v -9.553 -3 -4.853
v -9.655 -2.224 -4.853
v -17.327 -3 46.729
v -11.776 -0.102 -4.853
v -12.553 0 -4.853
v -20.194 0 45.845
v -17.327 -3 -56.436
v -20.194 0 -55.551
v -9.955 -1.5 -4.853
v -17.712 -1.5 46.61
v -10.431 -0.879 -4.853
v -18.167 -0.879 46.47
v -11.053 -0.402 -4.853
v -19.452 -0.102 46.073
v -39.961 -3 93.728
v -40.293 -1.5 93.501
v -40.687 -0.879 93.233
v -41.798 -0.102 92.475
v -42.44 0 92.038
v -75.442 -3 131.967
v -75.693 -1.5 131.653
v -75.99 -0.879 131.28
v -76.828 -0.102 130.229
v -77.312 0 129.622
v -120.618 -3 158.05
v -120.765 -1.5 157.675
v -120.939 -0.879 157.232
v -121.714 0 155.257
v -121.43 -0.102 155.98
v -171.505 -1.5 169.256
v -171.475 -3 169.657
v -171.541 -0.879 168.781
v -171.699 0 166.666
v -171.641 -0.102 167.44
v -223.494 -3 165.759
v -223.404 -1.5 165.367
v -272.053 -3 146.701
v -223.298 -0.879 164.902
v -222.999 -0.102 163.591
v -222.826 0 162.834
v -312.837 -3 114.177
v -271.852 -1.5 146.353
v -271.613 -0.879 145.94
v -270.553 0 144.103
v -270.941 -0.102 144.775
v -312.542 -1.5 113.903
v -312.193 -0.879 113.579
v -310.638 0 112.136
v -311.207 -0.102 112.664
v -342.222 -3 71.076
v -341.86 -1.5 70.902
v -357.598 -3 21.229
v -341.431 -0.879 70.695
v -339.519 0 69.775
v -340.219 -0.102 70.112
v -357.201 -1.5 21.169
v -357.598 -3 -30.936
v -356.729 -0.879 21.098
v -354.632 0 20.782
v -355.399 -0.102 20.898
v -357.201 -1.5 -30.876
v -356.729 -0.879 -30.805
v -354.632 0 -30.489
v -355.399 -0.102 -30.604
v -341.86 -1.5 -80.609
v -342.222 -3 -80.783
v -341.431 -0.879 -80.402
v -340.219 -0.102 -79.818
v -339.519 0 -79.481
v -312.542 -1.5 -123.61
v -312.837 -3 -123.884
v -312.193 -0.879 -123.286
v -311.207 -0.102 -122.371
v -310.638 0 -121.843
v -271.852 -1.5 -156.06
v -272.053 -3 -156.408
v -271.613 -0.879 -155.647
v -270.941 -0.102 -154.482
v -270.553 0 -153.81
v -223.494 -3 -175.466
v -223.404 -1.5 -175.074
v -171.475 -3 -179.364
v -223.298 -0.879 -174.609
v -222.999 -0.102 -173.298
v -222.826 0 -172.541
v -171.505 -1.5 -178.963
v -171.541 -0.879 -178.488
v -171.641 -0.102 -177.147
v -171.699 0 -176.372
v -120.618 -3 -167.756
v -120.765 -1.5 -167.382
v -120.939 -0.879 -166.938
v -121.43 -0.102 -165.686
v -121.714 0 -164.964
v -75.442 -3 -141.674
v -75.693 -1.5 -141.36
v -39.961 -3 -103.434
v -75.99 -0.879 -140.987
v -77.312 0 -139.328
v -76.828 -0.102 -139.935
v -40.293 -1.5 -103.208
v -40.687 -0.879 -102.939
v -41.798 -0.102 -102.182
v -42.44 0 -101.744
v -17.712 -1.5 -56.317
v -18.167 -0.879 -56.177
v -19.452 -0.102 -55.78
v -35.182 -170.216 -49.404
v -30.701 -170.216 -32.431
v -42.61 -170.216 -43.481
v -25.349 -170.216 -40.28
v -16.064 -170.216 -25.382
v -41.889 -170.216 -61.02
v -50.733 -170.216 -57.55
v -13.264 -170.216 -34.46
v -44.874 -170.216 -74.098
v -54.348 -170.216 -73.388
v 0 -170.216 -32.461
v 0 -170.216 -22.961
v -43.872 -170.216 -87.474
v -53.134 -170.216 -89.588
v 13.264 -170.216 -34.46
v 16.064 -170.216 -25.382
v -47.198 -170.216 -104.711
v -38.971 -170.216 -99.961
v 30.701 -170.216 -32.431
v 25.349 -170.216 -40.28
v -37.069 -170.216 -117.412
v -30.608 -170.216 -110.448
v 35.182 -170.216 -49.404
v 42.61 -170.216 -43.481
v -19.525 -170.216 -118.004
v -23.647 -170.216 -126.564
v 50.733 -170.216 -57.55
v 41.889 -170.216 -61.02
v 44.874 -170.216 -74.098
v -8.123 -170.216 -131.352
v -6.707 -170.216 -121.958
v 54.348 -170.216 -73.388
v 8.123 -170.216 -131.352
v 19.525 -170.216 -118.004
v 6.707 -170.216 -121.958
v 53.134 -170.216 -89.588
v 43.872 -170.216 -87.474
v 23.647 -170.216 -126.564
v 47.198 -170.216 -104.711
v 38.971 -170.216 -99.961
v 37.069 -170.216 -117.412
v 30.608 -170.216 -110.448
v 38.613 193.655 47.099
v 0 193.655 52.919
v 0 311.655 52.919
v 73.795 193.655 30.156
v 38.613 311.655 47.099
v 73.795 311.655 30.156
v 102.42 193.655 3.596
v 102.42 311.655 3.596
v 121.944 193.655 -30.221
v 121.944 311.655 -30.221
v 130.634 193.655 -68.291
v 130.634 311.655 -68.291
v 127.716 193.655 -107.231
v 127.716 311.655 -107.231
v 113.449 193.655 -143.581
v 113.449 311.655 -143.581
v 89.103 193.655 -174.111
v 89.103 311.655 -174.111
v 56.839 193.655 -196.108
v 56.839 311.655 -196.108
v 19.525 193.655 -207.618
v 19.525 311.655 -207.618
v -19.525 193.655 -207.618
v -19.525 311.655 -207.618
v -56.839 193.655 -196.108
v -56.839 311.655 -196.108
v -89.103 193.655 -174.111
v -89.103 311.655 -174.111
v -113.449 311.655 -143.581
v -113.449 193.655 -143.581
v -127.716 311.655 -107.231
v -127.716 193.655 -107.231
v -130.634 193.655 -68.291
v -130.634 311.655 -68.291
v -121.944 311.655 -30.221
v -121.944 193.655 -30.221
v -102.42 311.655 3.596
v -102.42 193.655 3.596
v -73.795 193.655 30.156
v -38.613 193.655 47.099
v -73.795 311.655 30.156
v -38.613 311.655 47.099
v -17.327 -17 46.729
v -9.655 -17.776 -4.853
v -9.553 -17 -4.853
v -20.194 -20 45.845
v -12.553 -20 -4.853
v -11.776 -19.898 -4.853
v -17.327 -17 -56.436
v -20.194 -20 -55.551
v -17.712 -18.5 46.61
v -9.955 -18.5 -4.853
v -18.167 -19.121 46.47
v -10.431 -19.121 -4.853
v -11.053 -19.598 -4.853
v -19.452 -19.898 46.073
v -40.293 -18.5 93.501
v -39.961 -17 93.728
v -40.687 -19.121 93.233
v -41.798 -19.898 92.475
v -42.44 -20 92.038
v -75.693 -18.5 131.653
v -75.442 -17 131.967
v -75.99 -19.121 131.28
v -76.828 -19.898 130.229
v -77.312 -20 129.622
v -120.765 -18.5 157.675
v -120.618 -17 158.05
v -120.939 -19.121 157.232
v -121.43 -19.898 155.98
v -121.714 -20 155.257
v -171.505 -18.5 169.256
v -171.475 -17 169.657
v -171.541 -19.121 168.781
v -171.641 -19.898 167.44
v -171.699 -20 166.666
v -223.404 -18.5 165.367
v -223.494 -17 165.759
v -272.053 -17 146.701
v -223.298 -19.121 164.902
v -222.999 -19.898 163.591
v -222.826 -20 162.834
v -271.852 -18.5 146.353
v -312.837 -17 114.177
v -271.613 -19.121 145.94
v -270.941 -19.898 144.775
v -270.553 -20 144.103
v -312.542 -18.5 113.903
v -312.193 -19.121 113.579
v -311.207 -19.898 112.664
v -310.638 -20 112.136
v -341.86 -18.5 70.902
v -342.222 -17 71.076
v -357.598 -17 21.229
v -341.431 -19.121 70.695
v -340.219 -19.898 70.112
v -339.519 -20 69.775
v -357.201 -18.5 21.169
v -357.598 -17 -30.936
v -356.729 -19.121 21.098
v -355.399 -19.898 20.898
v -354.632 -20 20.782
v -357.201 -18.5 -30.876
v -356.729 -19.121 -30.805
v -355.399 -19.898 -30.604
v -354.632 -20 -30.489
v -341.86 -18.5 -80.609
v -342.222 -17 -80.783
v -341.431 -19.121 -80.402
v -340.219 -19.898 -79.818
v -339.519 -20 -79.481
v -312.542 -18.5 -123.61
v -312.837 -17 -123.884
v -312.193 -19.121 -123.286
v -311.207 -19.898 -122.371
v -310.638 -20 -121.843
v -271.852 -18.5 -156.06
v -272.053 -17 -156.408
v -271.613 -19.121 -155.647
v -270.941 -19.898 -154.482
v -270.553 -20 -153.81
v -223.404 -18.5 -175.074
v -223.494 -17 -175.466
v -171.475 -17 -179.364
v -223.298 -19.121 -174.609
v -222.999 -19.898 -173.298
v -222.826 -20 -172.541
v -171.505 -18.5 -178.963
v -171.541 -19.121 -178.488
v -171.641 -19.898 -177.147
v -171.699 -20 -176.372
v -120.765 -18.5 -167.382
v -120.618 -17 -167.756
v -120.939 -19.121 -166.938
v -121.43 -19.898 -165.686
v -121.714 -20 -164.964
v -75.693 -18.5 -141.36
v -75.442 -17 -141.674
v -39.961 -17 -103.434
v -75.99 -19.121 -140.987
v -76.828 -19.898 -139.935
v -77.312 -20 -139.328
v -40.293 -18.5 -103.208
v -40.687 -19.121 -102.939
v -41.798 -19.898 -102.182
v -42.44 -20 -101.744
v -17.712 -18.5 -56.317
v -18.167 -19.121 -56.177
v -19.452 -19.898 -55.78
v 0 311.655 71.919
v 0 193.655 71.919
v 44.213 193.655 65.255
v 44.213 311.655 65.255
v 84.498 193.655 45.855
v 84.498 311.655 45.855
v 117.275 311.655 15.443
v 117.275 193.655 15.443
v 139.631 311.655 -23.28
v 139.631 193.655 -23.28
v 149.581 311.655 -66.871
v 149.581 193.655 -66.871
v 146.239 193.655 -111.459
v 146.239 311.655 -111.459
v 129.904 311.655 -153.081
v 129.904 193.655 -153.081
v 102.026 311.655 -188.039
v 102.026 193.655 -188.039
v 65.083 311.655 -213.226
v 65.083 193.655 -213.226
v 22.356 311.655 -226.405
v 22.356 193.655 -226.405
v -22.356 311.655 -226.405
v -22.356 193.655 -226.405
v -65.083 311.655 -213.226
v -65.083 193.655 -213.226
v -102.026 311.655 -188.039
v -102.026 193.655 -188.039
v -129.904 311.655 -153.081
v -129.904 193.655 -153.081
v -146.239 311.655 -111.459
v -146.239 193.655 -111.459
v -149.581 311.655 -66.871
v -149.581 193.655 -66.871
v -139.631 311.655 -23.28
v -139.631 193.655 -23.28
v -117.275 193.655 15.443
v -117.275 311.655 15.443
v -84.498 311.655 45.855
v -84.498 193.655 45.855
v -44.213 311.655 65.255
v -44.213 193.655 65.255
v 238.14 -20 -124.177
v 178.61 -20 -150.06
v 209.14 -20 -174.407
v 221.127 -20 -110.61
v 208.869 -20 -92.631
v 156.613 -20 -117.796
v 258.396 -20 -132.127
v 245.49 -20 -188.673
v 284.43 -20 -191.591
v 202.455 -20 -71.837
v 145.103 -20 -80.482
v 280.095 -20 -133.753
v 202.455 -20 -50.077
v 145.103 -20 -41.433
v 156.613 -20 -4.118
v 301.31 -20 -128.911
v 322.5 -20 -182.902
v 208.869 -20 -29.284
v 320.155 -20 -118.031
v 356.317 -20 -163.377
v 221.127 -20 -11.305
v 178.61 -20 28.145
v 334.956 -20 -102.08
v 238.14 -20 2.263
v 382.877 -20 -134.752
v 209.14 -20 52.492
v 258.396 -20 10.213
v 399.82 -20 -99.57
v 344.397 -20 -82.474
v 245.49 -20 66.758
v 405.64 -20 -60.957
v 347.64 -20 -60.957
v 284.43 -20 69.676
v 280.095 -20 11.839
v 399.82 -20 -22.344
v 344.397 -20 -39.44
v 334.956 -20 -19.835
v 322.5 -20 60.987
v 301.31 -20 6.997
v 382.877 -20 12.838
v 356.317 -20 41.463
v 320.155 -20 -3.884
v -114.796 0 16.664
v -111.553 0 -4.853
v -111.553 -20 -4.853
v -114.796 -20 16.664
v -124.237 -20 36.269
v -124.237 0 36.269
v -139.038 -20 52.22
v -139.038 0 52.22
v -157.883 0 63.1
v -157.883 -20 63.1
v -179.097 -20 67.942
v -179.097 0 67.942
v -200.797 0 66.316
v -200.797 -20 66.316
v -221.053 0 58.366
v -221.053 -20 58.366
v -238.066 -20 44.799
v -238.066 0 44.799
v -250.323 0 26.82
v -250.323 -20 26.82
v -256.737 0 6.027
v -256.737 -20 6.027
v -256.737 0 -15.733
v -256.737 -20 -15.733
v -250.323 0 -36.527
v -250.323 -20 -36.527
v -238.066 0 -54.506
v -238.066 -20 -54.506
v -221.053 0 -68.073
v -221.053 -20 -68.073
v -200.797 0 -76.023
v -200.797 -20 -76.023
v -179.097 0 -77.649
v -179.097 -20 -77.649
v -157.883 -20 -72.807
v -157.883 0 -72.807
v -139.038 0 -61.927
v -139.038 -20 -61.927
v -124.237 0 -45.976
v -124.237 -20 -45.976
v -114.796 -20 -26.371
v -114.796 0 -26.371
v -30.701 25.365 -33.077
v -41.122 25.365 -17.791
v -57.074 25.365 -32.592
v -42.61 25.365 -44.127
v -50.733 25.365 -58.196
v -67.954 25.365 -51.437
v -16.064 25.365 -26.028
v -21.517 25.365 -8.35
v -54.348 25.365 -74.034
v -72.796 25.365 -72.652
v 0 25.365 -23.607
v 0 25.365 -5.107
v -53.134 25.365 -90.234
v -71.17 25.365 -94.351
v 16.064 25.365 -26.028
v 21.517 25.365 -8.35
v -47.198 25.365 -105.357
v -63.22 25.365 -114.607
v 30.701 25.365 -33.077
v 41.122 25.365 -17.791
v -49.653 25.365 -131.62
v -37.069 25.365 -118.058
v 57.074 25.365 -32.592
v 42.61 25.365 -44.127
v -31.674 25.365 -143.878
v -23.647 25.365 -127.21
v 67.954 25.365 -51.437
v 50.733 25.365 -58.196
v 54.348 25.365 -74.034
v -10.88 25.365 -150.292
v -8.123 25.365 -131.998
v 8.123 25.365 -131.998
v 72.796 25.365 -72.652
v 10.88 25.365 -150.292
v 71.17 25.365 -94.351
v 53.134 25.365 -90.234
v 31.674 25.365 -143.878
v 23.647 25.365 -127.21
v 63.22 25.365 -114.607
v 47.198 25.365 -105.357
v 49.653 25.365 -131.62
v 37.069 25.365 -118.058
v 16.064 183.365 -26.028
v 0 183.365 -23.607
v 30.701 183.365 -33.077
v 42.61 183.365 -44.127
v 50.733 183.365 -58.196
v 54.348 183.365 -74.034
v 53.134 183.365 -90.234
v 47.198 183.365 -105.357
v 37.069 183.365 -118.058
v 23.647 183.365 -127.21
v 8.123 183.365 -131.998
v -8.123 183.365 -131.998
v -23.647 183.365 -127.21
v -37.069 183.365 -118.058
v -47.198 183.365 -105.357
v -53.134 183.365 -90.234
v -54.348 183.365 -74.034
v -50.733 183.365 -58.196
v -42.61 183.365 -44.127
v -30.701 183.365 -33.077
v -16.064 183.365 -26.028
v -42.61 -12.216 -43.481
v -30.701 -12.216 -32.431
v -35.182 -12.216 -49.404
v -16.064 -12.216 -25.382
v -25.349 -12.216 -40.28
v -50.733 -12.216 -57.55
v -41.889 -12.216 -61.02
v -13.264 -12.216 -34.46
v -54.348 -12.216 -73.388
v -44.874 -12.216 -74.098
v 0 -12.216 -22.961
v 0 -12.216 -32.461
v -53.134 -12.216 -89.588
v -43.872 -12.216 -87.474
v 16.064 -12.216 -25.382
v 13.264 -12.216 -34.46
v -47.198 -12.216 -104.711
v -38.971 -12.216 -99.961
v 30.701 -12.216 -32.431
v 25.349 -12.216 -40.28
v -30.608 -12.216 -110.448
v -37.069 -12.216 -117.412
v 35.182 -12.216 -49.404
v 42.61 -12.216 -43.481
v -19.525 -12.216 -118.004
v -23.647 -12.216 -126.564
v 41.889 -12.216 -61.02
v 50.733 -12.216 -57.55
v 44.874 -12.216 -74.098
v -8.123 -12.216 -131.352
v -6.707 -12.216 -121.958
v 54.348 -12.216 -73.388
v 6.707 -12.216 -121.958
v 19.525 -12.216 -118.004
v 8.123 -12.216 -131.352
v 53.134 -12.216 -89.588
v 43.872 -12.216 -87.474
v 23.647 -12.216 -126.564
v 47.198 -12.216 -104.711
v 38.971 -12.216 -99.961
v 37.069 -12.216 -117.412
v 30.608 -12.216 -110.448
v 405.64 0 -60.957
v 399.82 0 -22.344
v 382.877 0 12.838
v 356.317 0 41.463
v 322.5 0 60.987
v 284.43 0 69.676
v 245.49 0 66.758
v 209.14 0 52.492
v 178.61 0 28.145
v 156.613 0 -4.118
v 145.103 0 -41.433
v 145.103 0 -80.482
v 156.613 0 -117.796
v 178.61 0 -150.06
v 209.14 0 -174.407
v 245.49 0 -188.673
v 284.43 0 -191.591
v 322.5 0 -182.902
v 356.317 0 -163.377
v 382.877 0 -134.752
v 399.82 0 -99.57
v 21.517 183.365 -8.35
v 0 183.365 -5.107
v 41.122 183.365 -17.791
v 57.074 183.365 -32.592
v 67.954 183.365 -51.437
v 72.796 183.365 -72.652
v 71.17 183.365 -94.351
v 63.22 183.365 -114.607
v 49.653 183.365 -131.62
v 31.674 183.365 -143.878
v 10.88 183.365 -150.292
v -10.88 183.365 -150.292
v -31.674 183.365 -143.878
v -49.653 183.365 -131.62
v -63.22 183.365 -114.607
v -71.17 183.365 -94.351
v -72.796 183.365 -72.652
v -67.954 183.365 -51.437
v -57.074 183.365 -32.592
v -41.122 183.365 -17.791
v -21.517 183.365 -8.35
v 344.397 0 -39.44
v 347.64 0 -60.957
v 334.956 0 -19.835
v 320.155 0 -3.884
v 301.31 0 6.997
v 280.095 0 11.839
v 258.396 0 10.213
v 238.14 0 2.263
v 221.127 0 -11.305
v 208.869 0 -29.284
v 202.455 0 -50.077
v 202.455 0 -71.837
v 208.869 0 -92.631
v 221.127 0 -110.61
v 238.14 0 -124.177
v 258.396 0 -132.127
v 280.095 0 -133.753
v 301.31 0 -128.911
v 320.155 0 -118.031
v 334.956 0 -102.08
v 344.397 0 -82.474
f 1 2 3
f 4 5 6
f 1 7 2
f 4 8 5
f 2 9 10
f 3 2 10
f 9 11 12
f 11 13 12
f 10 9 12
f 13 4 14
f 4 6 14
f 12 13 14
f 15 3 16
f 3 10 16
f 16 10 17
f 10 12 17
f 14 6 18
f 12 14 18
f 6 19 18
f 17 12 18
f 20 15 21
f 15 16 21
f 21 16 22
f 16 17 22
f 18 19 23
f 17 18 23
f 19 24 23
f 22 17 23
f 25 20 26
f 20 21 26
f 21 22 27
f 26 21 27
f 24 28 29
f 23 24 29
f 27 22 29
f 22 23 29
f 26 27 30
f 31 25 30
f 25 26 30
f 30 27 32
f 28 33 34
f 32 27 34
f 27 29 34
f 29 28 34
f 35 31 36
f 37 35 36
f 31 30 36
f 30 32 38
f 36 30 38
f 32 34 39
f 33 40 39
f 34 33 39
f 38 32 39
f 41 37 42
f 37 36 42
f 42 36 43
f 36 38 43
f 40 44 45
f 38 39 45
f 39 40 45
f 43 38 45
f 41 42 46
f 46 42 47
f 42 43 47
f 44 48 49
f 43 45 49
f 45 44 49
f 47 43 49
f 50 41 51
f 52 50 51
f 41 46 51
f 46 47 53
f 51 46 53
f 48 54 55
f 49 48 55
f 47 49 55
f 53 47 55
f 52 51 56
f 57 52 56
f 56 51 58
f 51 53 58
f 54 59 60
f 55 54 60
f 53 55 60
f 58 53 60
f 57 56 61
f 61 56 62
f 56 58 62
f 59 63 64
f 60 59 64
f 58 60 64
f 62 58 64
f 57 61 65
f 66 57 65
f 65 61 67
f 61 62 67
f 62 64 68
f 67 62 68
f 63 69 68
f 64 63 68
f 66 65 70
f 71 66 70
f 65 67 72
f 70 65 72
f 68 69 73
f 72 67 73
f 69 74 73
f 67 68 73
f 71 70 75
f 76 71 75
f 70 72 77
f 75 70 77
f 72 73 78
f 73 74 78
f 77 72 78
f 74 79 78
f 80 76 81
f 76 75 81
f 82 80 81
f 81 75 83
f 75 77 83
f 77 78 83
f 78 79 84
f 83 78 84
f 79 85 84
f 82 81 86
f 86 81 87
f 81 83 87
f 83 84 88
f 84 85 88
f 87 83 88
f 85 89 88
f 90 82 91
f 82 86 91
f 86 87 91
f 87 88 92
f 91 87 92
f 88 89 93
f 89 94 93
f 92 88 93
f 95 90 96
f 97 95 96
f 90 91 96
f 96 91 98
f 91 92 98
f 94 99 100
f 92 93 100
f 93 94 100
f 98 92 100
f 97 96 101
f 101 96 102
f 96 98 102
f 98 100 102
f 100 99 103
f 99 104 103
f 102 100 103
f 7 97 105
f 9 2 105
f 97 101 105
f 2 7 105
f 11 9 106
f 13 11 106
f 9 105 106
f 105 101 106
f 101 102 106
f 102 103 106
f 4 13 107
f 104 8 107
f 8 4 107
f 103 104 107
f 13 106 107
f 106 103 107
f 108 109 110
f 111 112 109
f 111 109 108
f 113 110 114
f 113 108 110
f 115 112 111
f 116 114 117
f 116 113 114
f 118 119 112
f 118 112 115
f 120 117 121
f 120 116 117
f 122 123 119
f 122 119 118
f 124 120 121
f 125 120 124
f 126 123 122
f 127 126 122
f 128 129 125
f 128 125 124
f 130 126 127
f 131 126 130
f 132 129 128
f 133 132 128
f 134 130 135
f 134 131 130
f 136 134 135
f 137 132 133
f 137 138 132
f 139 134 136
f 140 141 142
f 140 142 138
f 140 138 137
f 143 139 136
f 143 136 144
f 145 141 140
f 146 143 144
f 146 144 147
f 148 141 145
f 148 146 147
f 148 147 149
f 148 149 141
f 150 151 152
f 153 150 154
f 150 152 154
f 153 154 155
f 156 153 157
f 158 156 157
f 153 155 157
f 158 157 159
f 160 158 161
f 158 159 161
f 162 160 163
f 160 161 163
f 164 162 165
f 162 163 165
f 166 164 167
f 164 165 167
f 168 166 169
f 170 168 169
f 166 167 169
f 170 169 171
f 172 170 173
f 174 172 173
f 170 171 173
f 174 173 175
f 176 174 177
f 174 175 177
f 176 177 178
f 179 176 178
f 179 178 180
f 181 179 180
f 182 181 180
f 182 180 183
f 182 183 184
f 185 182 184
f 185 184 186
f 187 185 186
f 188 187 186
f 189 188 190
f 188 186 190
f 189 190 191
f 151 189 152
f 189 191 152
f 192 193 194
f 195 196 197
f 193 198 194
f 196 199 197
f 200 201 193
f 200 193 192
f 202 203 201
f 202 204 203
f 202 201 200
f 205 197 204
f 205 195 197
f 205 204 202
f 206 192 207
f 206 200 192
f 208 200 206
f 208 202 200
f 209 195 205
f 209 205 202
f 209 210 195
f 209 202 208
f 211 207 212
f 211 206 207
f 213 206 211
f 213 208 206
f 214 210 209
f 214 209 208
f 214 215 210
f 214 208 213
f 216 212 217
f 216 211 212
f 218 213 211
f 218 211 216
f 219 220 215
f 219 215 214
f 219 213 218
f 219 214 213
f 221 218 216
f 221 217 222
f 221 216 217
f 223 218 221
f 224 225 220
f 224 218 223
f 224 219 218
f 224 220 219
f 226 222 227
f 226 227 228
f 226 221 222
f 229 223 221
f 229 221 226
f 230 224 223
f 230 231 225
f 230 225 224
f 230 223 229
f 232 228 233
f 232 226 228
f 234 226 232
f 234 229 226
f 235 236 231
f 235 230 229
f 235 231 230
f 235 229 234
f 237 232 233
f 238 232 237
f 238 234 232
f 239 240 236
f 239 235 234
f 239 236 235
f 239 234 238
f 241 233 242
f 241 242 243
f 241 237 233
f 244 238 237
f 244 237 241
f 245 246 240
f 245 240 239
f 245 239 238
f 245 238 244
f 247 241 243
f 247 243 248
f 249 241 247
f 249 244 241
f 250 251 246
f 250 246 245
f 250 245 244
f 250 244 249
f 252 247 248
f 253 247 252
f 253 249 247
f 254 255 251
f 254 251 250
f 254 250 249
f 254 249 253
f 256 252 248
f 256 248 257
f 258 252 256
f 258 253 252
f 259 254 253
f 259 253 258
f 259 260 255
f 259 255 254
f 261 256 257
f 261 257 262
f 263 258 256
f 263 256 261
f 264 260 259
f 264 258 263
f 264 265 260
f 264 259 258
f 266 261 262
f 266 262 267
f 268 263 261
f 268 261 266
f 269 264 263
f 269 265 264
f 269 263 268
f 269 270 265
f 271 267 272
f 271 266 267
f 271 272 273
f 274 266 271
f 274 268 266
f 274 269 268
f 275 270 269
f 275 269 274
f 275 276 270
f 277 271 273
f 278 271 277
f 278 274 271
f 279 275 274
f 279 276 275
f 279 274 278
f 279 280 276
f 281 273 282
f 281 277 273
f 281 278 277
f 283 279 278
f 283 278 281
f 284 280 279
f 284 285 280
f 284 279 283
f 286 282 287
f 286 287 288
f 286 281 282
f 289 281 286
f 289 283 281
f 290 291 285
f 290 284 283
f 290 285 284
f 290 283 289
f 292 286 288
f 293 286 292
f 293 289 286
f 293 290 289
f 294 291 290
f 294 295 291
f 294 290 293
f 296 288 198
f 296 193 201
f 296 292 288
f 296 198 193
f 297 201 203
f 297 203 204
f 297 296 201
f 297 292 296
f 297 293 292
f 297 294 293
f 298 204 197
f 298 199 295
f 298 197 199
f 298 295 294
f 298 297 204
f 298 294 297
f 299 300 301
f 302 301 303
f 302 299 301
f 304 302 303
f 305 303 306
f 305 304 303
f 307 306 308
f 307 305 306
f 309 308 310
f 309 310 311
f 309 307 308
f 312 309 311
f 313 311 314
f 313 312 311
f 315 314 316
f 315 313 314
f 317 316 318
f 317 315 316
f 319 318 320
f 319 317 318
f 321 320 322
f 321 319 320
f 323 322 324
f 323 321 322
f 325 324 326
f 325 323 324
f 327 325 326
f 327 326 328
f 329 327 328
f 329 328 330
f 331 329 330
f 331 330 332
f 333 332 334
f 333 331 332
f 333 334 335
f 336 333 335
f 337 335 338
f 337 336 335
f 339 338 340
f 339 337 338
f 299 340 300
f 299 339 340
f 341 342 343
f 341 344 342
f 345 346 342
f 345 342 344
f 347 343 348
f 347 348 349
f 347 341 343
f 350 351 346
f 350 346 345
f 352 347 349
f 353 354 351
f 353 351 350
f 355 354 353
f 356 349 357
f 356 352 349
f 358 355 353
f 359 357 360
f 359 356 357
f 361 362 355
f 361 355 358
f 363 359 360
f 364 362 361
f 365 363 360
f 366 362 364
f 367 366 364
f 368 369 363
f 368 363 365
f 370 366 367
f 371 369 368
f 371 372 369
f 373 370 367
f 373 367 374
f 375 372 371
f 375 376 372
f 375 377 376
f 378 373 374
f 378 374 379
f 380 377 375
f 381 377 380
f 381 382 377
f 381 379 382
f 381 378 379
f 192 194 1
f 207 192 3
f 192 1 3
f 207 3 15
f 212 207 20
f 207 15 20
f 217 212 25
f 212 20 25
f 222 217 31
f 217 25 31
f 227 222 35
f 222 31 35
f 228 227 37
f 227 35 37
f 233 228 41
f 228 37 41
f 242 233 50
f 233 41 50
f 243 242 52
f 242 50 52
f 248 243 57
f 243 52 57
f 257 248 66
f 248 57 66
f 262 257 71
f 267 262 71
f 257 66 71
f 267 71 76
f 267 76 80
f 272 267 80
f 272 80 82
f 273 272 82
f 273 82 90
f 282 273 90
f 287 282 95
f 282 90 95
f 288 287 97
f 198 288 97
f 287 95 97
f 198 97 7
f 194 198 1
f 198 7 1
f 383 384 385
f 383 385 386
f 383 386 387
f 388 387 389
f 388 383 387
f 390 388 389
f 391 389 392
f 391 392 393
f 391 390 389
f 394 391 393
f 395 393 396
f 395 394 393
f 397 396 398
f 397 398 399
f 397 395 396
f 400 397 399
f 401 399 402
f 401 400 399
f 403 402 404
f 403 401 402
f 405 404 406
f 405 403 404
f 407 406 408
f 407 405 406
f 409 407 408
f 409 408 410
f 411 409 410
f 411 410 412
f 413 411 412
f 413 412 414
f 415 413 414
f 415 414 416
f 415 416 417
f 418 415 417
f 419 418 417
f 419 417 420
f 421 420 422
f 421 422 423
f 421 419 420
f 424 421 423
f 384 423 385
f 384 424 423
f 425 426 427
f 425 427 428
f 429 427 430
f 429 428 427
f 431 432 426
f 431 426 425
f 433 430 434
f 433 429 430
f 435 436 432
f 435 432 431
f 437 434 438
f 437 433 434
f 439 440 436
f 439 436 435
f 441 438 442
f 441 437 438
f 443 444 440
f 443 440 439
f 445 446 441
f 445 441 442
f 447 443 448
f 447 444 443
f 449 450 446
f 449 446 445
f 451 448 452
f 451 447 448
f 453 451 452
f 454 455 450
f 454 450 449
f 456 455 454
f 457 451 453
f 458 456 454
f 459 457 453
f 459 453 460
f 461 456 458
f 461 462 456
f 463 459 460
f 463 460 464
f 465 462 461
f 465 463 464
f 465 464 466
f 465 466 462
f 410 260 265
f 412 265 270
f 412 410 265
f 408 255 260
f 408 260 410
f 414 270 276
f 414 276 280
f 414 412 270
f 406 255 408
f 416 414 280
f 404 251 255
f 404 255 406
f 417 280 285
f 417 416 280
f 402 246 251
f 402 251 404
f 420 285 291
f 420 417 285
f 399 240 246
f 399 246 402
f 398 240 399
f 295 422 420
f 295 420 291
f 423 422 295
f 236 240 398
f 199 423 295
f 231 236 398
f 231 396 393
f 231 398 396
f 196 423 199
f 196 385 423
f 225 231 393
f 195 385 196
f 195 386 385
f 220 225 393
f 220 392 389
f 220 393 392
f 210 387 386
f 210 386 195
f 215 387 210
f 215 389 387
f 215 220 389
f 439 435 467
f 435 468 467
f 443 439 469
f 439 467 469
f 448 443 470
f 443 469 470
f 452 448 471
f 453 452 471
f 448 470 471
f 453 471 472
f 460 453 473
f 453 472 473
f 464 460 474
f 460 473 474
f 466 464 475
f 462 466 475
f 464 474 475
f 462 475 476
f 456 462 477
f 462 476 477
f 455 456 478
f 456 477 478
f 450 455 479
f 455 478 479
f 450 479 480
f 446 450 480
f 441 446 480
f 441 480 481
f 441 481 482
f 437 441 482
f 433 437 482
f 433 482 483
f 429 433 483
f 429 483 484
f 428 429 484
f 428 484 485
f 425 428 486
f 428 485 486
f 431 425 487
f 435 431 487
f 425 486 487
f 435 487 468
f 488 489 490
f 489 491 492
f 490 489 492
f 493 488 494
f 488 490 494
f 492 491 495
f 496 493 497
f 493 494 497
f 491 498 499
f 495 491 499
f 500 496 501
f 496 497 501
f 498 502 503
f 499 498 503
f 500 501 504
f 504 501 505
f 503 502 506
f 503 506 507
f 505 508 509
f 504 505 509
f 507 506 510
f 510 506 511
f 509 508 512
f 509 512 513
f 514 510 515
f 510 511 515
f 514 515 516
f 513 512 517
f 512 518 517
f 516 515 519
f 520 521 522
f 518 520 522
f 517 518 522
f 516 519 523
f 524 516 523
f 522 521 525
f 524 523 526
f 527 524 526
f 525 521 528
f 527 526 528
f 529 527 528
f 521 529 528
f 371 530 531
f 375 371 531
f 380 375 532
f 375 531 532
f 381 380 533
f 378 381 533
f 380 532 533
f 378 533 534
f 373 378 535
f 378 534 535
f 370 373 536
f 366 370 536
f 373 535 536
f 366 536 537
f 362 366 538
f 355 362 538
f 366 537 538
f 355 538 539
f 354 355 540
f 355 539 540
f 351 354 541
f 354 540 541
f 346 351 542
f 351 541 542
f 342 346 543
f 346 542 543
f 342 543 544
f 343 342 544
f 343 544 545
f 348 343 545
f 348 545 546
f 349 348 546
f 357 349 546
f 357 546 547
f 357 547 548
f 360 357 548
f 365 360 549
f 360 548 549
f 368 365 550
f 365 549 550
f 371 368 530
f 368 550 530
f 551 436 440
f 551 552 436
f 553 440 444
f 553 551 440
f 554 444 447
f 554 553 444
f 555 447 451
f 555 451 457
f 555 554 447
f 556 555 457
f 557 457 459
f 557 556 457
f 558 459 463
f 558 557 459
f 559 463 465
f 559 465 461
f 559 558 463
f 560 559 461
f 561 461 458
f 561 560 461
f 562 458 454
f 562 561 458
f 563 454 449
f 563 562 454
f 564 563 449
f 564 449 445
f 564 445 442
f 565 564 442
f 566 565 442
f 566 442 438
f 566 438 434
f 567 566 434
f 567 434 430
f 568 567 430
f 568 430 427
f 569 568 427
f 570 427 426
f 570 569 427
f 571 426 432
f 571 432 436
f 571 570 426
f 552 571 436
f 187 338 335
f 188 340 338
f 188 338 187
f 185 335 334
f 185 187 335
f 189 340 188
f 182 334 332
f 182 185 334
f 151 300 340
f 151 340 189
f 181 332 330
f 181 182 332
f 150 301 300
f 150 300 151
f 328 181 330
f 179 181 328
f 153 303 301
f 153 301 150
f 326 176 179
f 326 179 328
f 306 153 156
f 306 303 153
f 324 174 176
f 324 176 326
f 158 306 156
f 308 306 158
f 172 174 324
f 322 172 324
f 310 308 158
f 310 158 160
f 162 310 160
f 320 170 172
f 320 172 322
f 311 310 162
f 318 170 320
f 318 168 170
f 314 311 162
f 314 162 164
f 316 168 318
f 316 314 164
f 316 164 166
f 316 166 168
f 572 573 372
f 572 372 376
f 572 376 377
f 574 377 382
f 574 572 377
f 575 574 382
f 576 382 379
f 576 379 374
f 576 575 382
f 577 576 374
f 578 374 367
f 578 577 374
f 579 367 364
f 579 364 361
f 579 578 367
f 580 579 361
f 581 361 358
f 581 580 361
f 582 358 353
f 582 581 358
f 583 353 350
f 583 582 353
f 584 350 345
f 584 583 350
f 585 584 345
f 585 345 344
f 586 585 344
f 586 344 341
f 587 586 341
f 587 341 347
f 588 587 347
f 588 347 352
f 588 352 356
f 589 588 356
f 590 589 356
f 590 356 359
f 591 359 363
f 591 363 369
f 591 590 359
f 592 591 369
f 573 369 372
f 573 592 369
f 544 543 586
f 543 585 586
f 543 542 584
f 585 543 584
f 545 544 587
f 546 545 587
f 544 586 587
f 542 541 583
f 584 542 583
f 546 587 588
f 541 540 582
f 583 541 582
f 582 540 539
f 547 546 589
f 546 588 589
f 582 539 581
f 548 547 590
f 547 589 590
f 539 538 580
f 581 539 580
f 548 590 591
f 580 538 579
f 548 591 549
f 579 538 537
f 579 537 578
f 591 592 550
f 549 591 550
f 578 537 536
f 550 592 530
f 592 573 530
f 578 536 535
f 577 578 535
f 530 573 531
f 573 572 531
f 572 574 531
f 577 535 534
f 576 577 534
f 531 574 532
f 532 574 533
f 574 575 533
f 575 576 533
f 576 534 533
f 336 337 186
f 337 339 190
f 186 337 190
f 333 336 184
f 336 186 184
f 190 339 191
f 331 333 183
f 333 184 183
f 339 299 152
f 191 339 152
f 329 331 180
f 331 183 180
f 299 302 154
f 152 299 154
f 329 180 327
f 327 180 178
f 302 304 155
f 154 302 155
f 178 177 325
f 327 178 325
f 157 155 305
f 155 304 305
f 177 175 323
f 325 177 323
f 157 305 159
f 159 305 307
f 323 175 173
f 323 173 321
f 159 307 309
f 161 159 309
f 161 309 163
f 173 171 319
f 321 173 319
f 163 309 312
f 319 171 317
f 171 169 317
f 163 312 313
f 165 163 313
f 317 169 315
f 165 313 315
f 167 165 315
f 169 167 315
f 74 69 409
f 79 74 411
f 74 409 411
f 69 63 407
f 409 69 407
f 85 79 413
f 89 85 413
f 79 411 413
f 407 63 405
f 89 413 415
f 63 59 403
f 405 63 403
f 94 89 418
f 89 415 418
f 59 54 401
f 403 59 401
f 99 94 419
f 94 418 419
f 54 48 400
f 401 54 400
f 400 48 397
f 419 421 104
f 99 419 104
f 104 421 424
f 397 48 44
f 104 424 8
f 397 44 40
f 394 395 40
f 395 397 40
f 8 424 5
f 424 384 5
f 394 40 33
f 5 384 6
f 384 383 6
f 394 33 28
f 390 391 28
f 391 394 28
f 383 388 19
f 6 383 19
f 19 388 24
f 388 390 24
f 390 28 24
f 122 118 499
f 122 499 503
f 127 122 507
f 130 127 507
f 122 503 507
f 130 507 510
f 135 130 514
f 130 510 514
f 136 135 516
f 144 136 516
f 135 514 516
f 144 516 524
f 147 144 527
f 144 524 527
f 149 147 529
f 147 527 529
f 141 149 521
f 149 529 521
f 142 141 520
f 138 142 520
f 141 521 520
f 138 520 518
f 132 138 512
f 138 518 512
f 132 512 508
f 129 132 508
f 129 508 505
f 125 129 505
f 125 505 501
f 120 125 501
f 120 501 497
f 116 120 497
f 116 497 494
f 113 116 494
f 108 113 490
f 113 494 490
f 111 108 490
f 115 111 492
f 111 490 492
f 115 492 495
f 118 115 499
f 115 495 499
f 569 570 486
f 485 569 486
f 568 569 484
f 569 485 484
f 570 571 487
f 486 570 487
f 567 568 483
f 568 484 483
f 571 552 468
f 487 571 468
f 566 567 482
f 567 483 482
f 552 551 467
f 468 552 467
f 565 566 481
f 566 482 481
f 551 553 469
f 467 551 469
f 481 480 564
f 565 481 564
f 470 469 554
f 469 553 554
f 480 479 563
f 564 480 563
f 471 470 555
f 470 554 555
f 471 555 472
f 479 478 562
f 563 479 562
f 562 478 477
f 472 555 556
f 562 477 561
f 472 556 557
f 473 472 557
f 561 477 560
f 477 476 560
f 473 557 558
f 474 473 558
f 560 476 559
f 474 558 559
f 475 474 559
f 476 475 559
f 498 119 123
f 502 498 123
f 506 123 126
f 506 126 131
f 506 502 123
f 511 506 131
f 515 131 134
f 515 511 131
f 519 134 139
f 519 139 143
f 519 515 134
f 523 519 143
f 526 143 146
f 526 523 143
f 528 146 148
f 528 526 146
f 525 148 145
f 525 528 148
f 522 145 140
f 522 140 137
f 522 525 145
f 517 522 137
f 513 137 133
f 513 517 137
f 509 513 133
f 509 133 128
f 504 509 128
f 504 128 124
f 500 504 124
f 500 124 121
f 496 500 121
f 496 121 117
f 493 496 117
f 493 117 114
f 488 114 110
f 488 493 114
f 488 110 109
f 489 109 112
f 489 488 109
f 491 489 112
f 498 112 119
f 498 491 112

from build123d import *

# Parameters (mm, degrees)
F3_R     = 175
F3_R_2   = 73
F5_DEPTH = 20
F4_R     = 131
F4_R_2   = 73
F6_DEPTH = 20
F0_W     = 158
F0_H     = 9.5
F1_W     = 158
F1_H     = 18.5
F2_W     = 118
F2_H     = 19
F10_R    = 3


with BuildPart() as f5:
    # F3 (on Front) → F5 (new body)
    with BuildSketch(Plane.XZ):
        with Locations((-184.552729, -4.853381)):
            Circle(F3_R)
        with Locations((-184.552729, -4.853381)):
            Circle(F3_R_2, mode=Mode.SUBTRACT)
    extrude(amount=F5_DEPTH)

    # F10
    f10_edges = [f5.edges().sort_by_distance(p)[0] for p in [
        (-359.552729, -20, -4.853381),
        (-359.552729, 0, -4.853381),
    ]]
    fillet(f10_edges, radius=F10_R)


with BuildPart() as f6:
    # F4 (on Front) → F6 (new body)
    with BuildSketch(Plane.XZ):
        with Locations((274.640143, -60.957201)):
            Circle(F4_R)
        with Locations((274.640143, -60.957201)):
            Circle(F4_R_2, mode=Mode.SUBTRACT)
    extrude(amount=F6_DEPTH)


with BuildPart() as f7:
    # F0 (on Right) → F7 (revolve)
    with BuildSketch(Plane.YZ):
        with Locations((-91.216174, -27.710743)):
            Rectangle(F0_W, F0_H)
    revolve(axis=Axis((0, -91.216174, -77.460743), (0, 1, 0)))


with BuildPart() as f8:
    # F1 (on Right) → F8 (revolve)
    with BuildSketch(Plane.YZ):
        with Locations((104.364555, -14.356865)):
            Rectangle(F1_W, F1_H)
    revolve(axis=Axis((0, 104.364555, -78.106865), (0, 1, 0)))


with BuildPart() as f9:
    # F2 (on Right) → F9 (revolve)
    with BuildSketch(Plane.YZ):
        with Locations((252.655372, 62.419197)):
            Rectangle(F2_W, F2_H)
    revolve(axis=Axis((0, 252.655372, -78.080803), (0, 1, 0)))


solid = Compound([f5.part, f6.part, f7.part, f8.part, f9.part])
